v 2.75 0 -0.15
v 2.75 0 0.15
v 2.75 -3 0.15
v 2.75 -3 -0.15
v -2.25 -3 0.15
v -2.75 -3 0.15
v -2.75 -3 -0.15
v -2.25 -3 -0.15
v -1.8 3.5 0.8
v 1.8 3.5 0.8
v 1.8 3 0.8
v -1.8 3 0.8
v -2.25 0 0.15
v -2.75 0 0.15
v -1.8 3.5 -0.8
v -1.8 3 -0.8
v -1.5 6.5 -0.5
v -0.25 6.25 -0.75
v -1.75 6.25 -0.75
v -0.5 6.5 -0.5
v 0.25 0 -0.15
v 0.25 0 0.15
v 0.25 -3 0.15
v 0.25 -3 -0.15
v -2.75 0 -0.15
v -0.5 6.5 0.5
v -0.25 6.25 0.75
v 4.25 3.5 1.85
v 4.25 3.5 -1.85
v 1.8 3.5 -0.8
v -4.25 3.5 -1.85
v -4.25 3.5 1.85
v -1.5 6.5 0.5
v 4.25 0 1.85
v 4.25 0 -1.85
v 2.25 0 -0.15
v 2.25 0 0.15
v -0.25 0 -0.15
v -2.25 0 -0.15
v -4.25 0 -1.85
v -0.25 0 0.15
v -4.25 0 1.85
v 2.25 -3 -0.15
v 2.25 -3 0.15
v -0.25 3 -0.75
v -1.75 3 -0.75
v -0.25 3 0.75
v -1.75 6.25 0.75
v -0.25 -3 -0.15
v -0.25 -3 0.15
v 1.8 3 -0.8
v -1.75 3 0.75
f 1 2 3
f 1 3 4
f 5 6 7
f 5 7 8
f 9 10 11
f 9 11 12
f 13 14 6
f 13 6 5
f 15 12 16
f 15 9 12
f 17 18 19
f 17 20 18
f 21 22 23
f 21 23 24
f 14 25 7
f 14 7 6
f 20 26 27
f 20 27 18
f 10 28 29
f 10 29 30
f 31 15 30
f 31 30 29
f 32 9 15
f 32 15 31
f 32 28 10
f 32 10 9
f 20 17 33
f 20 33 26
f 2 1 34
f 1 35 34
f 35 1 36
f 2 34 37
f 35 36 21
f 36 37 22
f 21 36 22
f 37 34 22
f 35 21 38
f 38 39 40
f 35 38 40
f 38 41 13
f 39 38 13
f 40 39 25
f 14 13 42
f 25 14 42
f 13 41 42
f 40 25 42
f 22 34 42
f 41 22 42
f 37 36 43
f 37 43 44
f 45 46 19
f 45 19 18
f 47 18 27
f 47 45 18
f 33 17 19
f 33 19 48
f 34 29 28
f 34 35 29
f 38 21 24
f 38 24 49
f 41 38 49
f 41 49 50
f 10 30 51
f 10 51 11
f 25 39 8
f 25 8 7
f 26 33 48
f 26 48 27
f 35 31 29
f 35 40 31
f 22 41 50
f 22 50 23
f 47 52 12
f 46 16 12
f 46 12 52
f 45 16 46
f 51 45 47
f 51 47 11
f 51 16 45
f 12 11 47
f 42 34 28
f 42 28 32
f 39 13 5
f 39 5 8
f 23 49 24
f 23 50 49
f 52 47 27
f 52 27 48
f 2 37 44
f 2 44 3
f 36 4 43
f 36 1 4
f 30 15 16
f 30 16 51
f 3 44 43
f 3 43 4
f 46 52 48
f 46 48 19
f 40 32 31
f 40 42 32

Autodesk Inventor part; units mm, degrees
ref_plane "YZ Plane" through (0, 0, 0) normal (1, 0, 0) x (0, 1, 0)
ref_plane "XZ Plane" through (0, 0, 0) normal (0, 1, 0) x (-1, 0, 0)
ref_plane "XY Plane" through (0, 0, 0) normal (0, 0, 1) x (1, 0, 0)
sketch "Sketch1" plane through (0, 0, 0) normal (0, 1, 0) x (-1, 0, 0)
  line L0 (4.25, -1.85) -> (-4.25, -1.85)
  line L1 (-4.25, -1.85) -> (-4.25, 1.85)
  line L2 (-4.25, 1.85) -> (4.25, 1.85)
  line L3 (4.25, 1.85) -> (4.25, -1.85)
  point P0 (0, 0)
  point P1 (4.25, 0)
  point P2 (0, -1.85)
  dimension "d0" = 8.5
  dimension "d1" = 3.7
extrude "Extrusion1" add sketch "Sketch1" along normal blind 3.5
sketch "Sketch2" plane through (0, 0, 0) normal (0, -1, 0) x (1, 0, 0)
  line L0 (4.25, 1.85) -> (-4.25, 1.85) projected
  line L1 (-2.75, 0.15) -> (-2.25, 0.15)
  line L2 (-2.25, 0.15) -> (-2.25, -0.15)
  line L3 (-2.25, -0.15) -> (-2.75, -0.15)
  line L4 (-2.75, -0.15) -> (-2.75, 0.15)
  line L5 (-0.25, 0.15) -> (0.25, 0.15)
  line L6 (0.25, 0.15) -> (0.25, -0.15)
  line L7 (0.25, -0.15) -> (-0.25, -0.15)
  line L8 (-0.25, -0.15) -> (-0.25, 0.15)
  line L9 (2.25, 0.15) -> (2.75, 0.15)
  line L10 (2.75, 0.15) -> (2.75, -0.15)
  line L11 (2.75, -0.15) -> (2.25, -0.15)
  line L12 (2.25, -0.15) -> (2.25, 0.15)
  point P0 (0, 0)
  point P1 (-2.75, 0)
  point P2 (-2.5, 0.15)
  point P3 (-0.25, 0)
  point P4 (0, 0.15)
  point P5 (2.25, 0)
  point P6 (2.5, 0.15)
  dimension "d4" = 0.5
  dimension "d5" = 0.3
  dimension "d6" = 2.5
  dimension "d9" = 2.5
extrude "Extrusion2" add sketch "Sketch2" along normal blind 3
sketch "Sketch3" plane through (0, 3.5, 0) normal (0, 1, 0) x (1, 0, 0)
  line L0 (-1.8, 0.8) -> (1.8, 0.8)
  line L1 (1.8, 0.8) -> (1.8, -0.8)
  line L2 (1.8, -0.8) -> (-1.8, -0.8)
  line L3 (-1.8, -0.8) -> (-1.8, 0.8)
  point P0 (0, 0)
  point P1 (-1.8, 0)
  point P2 (0, 0.8)
  dimension "d16" = 1.6
  dimension "d17" = 3.6
extrude "Extrusion3" cut sketch "Sketch3" against normal blind 0.5
sketch "Sketch4" plane through (0, 3, 0) normal (0, 1, 0) x (1, 0, 0)
  line L0 (-1.8, -0.8) -> (-1.8, 0.8) projected
  line L1 (-1.75, 0.75) -> (-0.25, 0.75)
  line L2 (-0.25, 0.75) -> (-0.25, -0.75)
  line L3 (-0.25, -0.75) -> (-1.75, -0.75)
  line L4 (-1.75, -0.75) -> (-1.75, 0.75)
  point P0 (0, 0)
  point P1 (-1.75, 0)
  dimension "d20" = 1.5
  dimension "d21" = 0.05
extrude "Extrusion4" add sketch "Sketch4" along normal blind 3.5
chamfer "Chamfer1" distance 0.25 angle 45 4 edges at (-1, 6.5, 0.75) (-0.25, 6.5, 0) (-1, 6.5, -0.75) (-1.75, 6.5, 0)
properties part number "Pololu #1408 Mini Slide Switch"
